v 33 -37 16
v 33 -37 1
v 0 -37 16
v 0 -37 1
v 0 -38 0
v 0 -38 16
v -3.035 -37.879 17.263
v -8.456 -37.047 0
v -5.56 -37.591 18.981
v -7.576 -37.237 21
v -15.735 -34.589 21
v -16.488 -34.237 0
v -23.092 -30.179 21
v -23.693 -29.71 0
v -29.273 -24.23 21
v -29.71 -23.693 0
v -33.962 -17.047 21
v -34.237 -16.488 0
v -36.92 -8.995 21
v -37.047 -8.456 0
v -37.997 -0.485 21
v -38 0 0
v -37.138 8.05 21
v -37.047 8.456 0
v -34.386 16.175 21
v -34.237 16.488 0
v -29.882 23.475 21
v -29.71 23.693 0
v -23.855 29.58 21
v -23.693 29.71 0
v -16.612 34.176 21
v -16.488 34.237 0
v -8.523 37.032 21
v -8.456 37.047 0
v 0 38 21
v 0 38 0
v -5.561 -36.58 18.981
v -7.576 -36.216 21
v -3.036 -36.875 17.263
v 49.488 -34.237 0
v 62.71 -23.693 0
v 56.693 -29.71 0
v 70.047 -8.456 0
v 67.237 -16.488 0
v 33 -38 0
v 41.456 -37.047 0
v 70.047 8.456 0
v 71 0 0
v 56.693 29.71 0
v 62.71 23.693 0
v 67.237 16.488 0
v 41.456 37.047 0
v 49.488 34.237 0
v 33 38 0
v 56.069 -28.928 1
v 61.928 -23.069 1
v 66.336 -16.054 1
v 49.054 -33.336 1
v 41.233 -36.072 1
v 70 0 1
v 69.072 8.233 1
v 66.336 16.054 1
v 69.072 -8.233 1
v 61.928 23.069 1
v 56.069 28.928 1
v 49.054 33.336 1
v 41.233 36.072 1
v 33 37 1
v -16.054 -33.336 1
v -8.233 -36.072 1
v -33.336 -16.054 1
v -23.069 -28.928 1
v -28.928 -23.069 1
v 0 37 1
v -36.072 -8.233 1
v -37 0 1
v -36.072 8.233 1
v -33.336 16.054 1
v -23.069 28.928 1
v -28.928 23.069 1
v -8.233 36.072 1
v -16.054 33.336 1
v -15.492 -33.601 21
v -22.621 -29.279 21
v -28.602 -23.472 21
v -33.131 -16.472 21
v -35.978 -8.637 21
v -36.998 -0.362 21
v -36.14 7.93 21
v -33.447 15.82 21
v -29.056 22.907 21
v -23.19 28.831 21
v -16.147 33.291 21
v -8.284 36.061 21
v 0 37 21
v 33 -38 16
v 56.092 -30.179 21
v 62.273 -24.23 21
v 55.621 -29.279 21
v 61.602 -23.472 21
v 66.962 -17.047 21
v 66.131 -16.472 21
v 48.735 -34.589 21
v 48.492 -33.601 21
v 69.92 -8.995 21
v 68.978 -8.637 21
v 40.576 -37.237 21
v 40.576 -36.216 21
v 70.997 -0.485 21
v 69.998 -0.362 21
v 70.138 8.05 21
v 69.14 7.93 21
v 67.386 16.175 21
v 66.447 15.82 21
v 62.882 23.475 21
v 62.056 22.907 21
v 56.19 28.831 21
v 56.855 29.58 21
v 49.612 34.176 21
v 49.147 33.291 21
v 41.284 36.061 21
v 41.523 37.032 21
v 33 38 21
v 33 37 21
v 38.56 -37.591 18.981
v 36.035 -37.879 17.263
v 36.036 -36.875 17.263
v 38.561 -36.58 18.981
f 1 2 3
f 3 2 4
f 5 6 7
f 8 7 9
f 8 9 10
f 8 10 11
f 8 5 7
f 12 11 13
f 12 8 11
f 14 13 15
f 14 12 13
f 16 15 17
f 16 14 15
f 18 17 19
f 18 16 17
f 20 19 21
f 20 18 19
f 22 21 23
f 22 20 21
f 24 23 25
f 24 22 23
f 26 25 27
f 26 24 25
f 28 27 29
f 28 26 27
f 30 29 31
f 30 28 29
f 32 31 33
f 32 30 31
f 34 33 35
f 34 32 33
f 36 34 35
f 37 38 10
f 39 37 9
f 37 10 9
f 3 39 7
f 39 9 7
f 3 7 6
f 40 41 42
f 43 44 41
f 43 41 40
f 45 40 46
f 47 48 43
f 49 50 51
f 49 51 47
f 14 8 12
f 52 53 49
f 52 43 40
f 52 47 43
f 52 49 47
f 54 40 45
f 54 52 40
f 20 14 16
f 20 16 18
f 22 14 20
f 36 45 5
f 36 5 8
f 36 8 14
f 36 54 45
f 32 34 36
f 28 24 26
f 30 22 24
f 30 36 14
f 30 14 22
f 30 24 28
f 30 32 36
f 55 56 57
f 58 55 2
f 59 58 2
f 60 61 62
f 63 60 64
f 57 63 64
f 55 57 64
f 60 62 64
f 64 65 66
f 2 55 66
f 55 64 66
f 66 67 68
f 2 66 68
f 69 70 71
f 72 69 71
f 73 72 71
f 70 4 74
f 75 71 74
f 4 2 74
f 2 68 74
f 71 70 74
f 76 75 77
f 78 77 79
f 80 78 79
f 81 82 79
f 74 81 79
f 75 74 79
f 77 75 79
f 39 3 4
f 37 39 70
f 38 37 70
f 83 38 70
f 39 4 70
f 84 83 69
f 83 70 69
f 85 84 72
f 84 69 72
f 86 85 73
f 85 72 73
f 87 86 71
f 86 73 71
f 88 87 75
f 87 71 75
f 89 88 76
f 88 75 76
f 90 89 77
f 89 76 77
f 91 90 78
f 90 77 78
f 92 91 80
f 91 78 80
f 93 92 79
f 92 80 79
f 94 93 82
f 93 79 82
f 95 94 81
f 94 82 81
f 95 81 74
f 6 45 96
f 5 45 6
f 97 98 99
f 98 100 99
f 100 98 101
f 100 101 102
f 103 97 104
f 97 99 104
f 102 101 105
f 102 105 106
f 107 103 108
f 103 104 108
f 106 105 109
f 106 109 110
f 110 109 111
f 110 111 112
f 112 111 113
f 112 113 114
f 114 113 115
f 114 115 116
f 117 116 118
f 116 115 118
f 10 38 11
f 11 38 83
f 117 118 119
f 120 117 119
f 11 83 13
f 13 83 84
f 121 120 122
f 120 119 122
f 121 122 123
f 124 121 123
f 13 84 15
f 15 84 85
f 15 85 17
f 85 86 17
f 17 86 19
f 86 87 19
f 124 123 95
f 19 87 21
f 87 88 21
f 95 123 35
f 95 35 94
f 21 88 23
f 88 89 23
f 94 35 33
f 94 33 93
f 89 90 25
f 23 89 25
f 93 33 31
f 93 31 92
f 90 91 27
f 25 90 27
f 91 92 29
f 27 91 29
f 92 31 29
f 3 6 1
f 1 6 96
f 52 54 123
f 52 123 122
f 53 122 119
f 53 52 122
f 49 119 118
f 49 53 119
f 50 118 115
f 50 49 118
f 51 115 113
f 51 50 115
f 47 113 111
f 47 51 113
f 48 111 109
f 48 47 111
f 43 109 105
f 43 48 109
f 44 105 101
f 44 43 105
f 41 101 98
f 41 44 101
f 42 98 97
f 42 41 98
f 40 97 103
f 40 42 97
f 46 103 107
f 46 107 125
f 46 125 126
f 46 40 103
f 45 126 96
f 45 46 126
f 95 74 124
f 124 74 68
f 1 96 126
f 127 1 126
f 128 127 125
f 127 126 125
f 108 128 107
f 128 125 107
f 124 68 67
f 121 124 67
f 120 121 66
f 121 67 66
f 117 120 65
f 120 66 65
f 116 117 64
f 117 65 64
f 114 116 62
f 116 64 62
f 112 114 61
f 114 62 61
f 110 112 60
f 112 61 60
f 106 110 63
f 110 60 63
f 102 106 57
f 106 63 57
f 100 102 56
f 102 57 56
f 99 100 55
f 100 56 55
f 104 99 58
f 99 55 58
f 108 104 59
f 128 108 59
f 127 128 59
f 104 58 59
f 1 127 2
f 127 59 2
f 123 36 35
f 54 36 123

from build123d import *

# Parameters (mm, degrees)
EXTRUDE_1_DEPTH     = 1
EXTRUDE_2_DEPTH     = 20
CUT_EXTRUDE_1_DEPTH = 20


with BuildPart() as part:
    # 草图1 → 凸台-拉伸1 (new body)
    with BuildSketch(Plane.XY):
        with BuildLine():
            Line((0, 38), (33, 38))
            ThreePointArc((33, 38), (71, 0), (33, -38))
            Line((33, -38), (0, -38))
            ThreePointArc((0, -38), (-38, 0), (0, 38))
        make_face()
    extrude(amount=EXTRUDE_1_DEPTH)

    # 草图2 → 凸台-拉伸2 (add)
    with BuildSketch(Plane.XY.offset(1)):
        with BuildLine():
            Line((0, 38), (33, 38))
            ThreePointArc((33, 38), (71, 0), (33, -38))
            Line((33, -38), (0, -38))
            ThreePointArc((0, -38), (-38, 0), (0, 38))
        make_face()
        with BuildLine():
            Line((0, 37), (33, 37))
            ThreePointArc((33, 37), (70, 0), (33, -37))
            Line((33, -37), (0, -37))
            ThreePointArc((0, -37), (-37, 0), (0, 37))
        make_face(mode=Mode.SUBTRACT)
    extrude(amount=EXTRUDE_2_DEPTH)

    # 草图3 → 切除-拉伸1 (cut)
    with BuildSketch(Plane.XZ.offset(38)):
        Polygon((0, 16), (33, 16), (33, 21), (16.5, 21), (0, 21), align=None)
        with BuildLine():
            ThreePointArc((-7.575757576, 21), (-4.158348613, 17.938682084), (0, 16))
            Line((0, 16), (0, 21))
            Line((0, 21), (-7.575757576, 21))
        make_face()
        with BuildLine():
            Line((33, 21), (33, 16))
            ThreePointArc((33, 16), (37.158348613, 17.938682084), (40.575757576, 21))
            Line((40.575757576, 21), (33, 21))
        make_face()
    extrude(amount=-CUT_EXTRUDE_1_DEPTH, mode=Mode.SUBTRACT)


solid = part.part
